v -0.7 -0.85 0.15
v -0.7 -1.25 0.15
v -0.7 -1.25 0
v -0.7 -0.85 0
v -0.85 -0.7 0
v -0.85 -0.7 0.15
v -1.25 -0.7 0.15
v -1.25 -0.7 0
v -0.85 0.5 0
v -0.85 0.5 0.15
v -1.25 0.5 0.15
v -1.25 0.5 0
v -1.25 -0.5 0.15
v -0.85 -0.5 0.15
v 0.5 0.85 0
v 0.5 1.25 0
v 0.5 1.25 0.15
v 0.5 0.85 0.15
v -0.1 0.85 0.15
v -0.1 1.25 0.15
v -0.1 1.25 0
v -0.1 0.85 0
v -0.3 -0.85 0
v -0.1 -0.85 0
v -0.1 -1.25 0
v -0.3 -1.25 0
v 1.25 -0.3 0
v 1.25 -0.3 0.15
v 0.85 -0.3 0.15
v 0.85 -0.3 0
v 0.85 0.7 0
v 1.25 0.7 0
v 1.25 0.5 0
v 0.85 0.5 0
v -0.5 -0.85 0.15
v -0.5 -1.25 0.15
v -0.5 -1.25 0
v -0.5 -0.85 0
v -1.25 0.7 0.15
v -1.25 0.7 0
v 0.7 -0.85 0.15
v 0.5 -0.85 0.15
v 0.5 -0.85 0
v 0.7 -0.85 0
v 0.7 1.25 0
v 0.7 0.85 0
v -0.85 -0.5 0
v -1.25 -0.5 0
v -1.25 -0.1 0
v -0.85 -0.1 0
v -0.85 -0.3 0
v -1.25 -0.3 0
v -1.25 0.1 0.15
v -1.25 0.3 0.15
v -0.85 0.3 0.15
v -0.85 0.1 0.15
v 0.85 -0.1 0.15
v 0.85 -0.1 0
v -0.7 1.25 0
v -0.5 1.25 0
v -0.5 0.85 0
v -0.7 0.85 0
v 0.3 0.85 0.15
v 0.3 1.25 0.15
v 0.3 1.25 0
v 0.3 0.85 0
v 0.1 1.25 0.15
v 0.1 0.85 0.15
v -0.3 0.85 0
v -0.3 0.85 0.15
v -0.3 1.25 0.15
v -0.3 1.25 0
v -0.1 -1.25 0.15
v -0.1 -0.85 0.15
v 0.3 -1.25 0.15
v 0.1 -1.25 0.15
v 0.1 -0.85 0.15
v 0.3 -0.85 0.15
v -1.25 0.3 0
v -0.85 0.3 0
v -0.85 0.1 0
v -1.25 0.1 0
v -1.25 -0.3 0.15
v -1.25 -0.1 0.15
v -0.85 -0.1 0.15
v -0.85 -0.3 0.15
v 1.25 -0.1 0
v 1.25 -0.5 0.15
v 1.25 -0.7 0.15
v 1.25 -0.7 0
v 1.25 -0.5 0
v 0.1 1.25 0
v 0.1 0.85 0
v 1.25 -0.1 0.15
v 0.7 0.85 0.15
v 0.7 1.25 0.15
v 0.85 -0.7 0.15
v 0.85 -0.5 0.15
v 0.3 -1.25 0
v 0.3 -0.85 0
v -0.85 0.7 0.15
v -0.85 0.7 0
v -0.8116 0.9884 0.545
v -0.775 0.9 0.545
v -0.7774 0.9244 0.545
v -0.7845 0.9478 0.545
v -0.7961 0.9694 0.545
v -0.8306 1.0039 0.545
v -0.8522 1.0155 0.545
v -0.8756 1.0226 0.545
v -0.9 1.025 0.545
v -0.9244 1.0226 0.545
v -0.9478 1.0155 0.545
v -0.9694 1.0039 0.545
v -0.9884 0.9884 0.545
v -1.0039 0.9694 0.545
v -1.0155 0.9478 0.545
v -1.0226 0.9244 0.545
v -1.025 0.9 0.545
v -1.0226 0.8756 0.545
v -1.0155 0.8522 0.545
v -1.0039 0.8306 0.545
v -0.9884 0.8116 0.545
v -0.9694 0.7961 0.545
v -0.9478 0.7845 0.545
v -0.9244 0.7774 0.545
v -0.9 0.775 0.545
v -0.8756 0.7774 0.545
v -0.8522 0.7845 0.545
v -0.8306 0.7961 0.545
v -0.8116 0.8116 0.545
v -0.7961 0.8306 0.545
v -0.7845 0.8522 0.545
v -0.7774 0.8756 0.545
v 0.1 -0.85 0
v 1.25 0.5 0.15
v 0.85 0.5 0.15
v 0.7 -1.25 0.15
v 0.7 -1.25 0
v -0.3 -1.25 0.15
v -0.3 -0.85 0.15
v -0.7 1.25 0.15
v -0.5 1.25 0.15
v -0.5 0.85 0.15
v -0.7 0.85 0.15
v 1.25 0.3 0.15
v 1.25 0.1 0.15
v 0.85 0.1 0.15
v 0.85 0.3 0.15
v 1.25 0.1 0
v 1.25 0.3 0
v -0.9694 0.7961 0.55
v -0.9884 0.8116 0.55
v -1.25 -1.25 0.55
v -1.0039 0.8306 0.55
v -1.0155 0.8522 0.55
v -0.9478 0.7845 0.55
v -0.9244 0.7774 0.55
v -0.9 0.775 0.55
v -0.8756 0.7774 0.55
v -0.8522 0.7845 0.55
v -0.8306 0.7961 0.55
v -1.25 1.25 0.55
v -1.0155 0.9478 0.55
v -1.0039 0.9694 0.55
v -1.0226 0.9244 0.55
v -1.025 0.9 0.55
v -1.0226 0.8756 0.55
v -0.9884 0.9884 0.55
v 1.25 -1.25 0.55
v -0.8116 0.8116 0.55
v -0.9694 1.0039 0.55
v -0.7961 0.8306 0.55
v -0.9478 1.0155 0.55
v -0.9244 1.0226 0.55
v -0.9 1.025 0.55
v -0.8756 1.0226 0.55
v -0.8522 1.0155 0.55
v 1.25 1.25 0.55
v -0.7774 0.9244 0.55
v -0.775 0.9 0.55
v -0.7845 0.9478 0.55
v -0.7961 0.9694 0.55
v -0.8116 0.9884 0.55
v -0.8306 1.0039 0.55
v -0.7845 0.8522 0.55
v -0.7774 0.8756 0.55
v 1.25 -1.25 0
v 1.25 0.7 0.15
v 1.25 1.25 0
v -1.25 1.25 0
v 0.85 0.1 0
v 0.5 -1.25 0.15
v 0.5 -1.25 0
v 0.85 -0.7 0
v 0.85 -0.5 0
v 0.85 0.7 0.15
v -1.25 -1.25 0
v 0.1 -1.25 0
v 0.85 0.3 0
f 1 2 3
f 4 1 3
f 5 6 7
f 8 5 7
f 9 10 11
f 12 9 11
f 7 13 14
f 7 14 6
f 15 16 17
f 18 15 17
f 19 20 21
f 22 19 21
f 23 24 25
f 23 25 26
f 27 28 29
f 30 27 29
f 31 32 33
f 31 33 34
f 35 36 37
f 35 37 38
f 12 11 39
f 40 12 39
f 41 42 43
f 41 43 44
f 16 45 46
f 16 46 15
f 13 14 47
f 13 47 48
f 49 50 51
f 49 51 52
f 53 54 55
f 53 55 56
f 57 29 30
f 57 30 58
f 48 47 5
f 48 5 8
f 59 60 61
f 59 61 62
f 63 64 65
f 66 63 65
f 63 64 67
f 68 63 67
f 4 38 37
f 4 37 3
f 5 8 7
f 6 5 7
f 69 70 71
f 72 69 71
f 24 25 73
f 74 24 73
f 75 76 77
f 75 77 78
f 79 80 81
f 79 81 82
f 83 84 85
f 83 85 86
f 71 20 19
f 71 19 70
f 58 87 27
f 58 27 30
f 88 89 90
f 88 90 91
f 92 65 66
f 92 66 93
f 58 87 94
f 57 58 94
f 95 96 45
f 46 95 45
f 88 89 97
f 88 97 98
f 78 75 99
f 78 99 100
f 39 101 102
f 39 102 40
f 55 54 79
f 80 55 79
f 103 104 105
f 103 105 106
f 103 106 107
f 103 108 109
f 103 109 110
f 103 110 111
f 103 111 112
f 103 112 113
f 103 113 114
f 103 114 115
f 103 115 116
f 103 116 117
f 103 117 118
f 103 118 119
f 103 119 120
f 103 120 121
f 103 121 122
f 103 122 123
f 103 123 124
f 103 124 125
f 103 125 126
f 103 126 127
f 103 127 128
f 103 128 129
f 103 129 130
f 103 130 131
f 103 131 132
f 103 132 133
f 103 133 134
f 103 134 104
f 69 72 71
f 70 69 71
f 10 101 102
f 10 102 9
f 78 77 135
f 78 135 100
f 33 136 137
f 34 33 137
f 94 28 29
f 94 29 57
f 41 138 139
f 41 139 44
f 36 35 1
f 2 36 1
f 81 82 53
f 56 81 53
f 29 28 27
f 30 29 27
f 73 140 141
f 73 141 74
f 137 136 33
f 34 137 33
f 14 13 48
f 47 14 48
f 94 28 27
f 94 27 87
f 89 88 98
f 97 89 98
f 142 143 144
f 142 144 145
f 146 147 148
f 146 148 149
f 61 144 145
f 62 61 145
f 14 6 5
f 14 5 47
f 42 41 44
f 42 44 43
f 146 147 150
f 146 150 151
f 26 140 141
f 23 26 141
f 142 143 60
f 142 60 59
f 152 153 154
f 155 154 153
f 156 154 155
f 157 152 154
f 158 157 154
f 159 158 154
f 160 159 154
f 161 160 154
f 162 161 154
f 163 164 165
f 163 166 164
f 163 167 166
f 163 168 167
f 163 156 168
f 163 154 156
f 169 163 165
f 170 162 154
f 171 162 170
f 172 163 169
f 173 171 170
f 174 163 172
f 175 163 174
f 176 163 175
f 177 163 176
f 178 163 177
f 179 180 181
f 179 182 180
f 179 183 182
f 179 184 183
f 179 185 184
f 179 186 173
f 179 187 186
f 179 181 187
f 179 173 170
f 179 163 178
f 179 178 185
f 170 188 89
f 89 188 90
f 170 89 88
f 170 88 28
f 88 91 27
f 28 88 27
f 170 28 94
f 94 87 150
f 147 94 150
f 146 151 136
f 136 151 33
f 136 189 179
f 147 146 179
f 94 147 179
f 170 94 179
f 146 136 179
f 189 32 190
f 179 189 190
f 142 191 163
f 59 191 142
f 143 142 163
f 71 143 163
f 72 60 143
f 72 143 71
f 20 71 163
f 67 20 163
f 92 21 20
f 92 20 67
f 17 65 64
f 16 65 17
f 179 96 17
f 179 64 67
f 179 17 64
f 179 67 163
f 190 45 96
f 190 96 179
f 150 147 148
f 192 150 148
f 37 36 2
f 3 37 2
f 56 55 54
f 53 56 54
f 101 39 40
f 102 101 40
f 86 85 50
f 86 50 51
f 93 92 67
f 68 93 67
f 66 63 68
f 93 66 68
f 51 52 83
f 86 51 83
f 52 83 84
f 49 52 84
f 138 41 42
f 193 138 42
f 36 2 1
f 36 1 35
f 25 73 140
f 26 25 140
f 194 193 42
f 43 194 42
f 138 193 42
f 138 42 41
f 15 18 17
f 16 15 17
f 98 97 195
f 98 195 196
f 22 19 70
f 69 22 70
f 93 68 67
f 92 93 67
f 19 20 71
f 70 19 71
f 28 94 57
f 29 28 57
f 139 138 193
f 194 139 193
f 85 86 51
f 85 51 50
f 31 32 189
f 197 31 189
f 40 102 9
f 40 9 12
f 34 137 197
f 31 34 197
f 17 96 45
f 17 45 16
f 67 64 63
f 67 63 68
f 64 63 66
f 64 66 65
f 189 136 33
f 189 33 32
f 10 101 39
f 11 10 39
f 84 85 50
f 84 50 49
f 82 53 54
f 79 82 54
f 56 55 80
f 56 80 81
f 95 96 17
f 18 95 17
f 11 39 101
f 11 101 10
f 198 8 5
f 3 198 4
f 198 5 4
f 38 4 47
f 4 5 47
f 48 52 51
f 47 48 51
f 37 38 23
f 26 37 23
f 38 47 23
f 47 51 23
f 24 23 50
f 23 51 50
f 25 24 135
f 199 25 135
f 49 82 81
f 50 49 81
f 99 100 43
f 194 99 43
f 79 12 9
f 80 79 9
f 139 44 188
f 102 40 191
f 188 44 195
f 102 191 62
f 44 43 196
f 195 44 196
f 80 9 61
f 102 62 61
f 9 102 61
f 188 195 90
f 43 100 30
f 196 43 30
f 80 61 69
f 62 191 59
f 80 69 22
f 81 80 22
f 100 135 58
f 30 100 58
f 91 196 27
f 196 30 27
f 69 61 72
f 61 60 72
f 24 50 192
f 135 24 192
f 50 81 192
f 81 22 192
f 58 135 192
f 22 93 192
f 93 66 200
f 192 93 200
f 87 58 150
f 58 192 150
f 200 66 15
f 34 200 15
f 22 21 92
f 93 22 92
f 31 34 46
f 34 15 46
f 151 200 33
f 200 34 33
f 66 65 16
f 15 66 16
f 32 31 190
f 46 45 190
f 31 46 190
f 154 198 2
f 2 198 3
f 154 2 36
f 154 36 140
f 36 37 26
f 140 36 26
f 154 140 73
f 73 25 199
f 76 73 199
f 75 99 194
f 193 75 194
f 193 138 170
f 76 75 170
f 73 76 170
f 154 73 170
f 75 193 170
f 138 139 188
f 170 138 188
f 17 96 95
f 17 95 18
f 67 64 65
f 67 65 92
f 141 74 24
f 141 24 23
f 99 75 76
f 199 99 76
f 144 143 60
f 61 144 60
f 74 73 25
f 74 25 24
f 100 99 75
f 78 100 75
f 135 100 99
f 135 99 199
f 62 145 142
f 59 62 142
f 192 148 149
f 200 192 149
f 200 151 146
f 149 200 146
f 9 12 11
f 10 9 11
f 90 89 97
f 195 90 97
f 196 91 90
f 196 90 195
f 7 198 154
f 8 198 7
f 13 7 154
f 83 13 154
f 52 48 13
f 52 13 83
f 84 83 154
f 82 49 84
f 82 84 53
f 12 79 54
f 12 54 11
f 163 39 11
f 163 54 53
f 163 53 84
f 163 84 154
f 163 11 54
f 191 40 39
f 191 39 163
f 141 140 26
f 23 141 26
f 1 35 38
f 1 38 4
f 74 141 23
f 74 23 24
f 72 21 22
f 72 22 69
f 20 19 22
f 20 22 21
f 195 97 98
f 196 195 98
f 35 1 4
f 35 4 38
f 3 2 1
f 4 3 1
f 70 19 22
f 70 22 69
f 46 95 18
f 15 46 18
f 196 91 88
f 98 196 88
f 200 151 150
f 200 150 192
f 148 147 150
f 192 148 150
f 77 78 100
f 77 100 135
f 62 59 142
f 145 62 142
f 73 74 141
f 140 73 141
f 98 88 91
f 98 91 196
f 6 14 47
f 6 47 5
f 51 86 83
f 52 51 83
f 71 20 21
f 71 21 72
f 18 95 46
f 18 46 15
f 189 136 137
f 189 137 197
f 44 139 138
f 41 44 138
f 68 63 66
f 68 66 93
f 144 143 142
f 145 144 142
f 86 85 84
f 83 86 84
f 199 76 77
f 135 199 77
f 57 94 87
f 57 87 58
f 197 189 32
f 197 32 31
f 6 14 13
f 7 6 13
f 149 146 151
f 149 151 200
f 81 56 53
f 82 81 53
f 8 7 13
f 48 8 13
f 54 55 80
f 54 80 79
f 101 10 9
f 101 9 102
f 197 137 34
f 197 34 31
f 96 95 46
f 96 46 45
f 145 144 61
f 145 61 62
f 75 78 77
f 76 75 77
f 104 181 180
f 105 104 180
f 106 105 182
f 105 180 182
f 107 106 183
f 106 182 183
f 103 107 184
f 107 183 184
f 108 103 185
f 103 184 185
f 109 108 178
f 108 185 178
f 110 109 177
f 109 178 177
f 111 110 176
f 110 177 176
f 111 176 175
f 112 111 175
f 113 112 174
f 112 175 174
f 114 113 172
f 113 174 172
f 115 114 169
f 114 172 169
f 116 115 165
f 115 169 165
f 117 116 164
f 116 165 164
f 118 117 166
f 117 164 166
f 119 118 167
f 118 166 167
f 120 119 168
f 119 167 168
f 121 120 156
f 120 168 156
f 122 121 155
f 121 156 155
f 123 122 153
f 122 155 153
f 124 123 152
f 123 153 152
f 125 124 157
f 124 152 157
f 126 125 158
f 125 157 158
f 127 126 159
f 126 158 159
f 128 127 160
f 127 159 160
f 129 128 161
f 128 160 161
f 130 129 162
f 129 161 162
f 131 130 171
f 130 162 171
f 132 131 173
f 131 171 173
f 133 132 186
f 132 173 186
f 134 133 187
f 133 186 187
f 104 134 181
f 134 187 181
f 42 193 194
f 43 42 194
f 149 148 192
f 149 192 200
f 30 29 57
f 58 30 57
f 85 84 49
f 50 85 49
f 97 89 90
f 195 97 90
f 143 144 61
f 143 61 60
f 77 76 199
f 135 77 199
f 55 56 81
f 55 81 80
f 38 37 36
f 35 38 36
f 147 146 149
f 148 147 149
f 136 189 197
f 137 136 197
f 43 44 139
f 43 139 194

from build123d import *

# Parameters (mm, degrees)
SKETCH1_W              = 2.5
SKETCH1_H              = 2.5
BOSS_EXTRUDE1_DEPTH    = 0.55
SKETCH2_W              = 0.2
SKETCH2_H              = 0.15
CUT_EXTRUDE1_DEPTH     = 0.4
CIRPATTERN1_COUNT      = 4
SKETCH3_W              = 0.2
SKETCH3_H              = 0.4
BOSS_EXTRUDE2_DEPTH    = 0.15
BOSS_EXTRUDE2_2_DEPTH  = 0.15
BOSS_EXTRUDE2_3_DEPTH  = 0.15
BOSS_EXTRUDE2_4_DEPTH  = 0.15
SKETCH3_W_2            = 0.4
SKETCH3_H_2            = 0.2
BOSS_EXTRUDE2_5_DEPTH  = 0.15
BOSS_EXTRUDE2_6_DEPTH  = 0.15
BOSS_EXTRUDE2_7_DEPTH  = 0.15
BOSS_EXTRUDE2_8_DEPTH  = 0.15
BOSS_EXTRUDE2_9_DEPTH  = 0.15
BOSS_EXTRUDE2_10_DEPTH = 0.15
BOSS_EXTRUDE2_11_DEPTH = 0.15
BOSS_EXTRUDE2_12_DEPTH = 0.15
BOSS_EXTRUDE2_13_DEPTH = 0.15
BOSS_EXTRUDE2_14_DEPTH = 0.15
BOSS_EXTRUDE2_15_DEPTH = 0.15
BOSS_EXTRUDE2_16_DEPTH = 0.15
SKETCH4_R              = 0.125
CUT_EXTRUDE2_DEPTH     = 0.005


with BuildPart() as part:
    # Sketch1 → Boss-Extrude1 (new body)
    with BuildSketch(Plane.XY):
        Rectangle(SKETCH1_W, SKETCH1_H)
    extrude(amount=BOSS_EXTRUDE1_DEPTH)

    # Sketch2 → Cut-Extrude1 (cut)
    with BuildSketch(Plane.XZ.offset(1.25)):
        with Locations((0.6, -0.075)):
            Rectangle(SKETCH2_W, SKETCH2_H)
        with Locations((0.6, 0.075)):
            Rectangle(SKETCH2_W, SKETCH2_H)
        with Locations((0.2, -0.075)):
            Rectangle(SKETCH2_W, SKETCH2_H)
        with Locations((0.2, 0.075)):
            Rectangle(SKETCH2_W, SKETCH2_H)
        with Locations((-0.2, 0.075)):
            Rectangle(SKETCH2_W, SKETCH2_H)
        with Locations((-0.2, -0.075)):
            Rectangle(SKETCH2_W, SKETCH2_H)
        with Locations((-0.6, 0.075)):
            Rectangle(SKETCH2_W, SKETCH2_H)
        with Locations((-0.6, -0.075)):
            Rectangle(SKETCH2_W, SKETCH2_H)
    cut_extrude1 = extrude(amount=-CUT_EXTRUDE1_DEPTH, mode=Mode.SUBTRACT)

    # CirPattern1: Cut-Extrude1 ×4 about axis
    cirpattern1_axis = Axis((0, 0, 0), (0, 0, 1))
    for i in range(1, CIRPATTERN1_COUNT):
        add(cut_extrude1.rotate(cirpattern1_axis, i * 360 / CIRPATTERN1_COUNT), mode=Mode.SUBTRACT)

    # Sketch4 → Cut-Extrude2 (cut)
    with BuildSketch(Plane.XY.offset(0.55)):
        with Locations((-0.9, 0.9)):
            Circle(SKETCH4_R)
    extrude(amount=-CUT_EXTRUDE2_DEPTH, mode=Mode.SUBTRACT)


with BuildPart() as body_2:
    # Sketch3 → Boss-Extrude2 (new body)
    with BuildSketch(Plane(origin=(0, 0, 0.15), x_dir=(-1, 0, 0), z_dir=(0, 0, -1))):
        with Locations((-0.6, -1.05)):
            Rectangle(SKETCH3_W, SKETCH3_H)
    extrude(amount=BOSS_EXTRUDE2_DEPTH)


with BuildPart() as body_3:
    # Sketch3 → Boss-Extrude2 2 (new body)
    with BuildSketch(Plane(origin=(0, 0, 0.15), x_dir=(-1, 0, 0), z_dir=(0, 0, -1))):
        with Locations((-0.2, -1.05)):
            Rectangle(SKETCH3_W, SKETCH3_H)
    extrude(amount=BOSS_EXTRUDE2_2_DEPTH)


with BuildPart() as body_4:
    # Sketch3 → Boss-Extrude2 3 (new body)
    with BuildSketch(Plane(origin=(0, 0, 0.15), x_dir=(-1, 0, 0), z_dir=(0, 0, -1))):
        with Locations((0.2, -1.05)):
            Rectangle(SKETCH3_W, SKETCH3_H)
    extrude(amount=BOSS_EXTRUDE2_3_DEPTH)


with BuildPart() as body_5:
    # Sketch3 → Boss-Extrude2 4 (new body)
    with BuildSketch(Plane(origin=(0, 0, 0.15), x_dir=(-1, 0, 0), z_dir=(0, 0, -1))):
        with Locations((0.6, -1.05)):
            Rectangle(SKETCH3_W, SKETCH3_H)
    extrude(amount=BOSS_EXTRUDE2_4_DEPTH)


with BuildPart() as body_6:
    # Sketch3 → Boss-Extrude2 5 (new body)
    with BuildSketch(Plane(origin=(0, 0, 0.15), x_dir=(-1, 0, 0), z_dir=(0, 0, -1))):
        with Locations((1.05, -0.6)):
            Rectangle(SKETCH3_W_2, SKETCH3_H_2)
    extrude(amount=BOSS_EXTRUDE2_5_DEPTH)


with BuildPart() as body_7:
    # Sketch3 → Boss-Extrude2 6 (new body)
    with BuildSketch(Plane(origin=(0, 0, 0.15), x_dir=(-1, 0, 0), z_dir=(0, 0, -1))):
        with Locations((1.05, -0.2)):
            Rectangle(SKETCH3_W_2, SKETCH3_H_2)
    extrude(amount=BOSS_EXTRUDE2_6_DEPTH)


with BuildPart() as body_8:
    # Sketch3 → Boss-Extrude2 7 (new body)
    with BuildSketch(Plane(origin=(0, 0, 0.15), x_dir=(-1, 0, 0), z_dir=(0, 0, -1))):
        with Locations((1.05, 0.2)):
            Rectangle(SKETCH3_W_2, SKETCH3_H_2)
    extrude(amount=BOSS_EXTRUDE2_7_DEPTH)


with BuildPart() as body_9:
    # Sketch3 → Boss-Extrude2 8 (new body)
    with BuildSketch(Plane(origin=(0, 0, 0.15), x_dir=(-1, 0, 0), z_dir=(0, 0, -1))):
        with Locations((1.05, 0.6)):
            Rectangle(SKETCH3_W_2, SKETCH3_H_2)
    extrude(amount=BOSS_EXTRUDE2_8_DEPTH)


with BuildPart() as body_10:
    # Sketch3 → Boss-Extrude2 9 (new body)
    with BuildSketch(Plane(origin=(0, 0, 0.15), x_dir=(-1, 0, 0), z_dir=(0, 0, -1))):
        with Locations((0.6, 1.05)):
            Rectangle(SKETCH3_W, SKETCH3_H)
    extrude(amount=BOSS_EXTRUDE2_9_DEPTH)


with BuildPart() as body_11:
    # Sketch3 → Boss-Extrude2 10 (new body)
    with BuildSketch(Plane(origin=(0, 0, 0.15), x_dir=(-1, 0, 0), z_dir=(0, 0, -1))):
        with Locations((0.2, 1.05)):
            Rectangle(SKETCH3_W, SKETCH3_H)
    extrude(amount=BOSS_EXTRUDE2_10_DEPTH)


with BuildPart() as body_12:
    # Sketch3 → Boss-Extrude2 11 (new body)
    with BuildSketch(Plane(origin=(0, 0, 0.15), x_dir=(-1, 0, 0), z_dir=(0, 0, -1))):
        with Locations((-0.2, 1.05)):
            Rectangle(SKETCH3_W, SKETCH3_H)
    extrude(amount=BOSS_EXTRUDE2_11_DEPTH)


with BuildPart() as body_13:
    # Sketch3 → Boss-Extrude2 12 (new body)
    with BuildSketch(Plane(origin=(0, 0, 0.15), x_dir=(-1, 0, 0), z_dir=(0, 0, -1))):
        with Locations((-0.6, 1.05)):
            Rectangle(SKETCH3_W, SKETCH3_H)
    extrude(amount=BOSS_EXTRUDE2_12_DEPTH)


with BuildPart() as body_14:
    # Sketch3 → Boss-Extrude2 13 (new body)
    with BuildSketch(Plane(origin=(0, 0, 0.15), x_dir=(-1, 0, 0), z_dir=(0, 0, -1))):
        with Locations((-1.05, 0.6)):
            Rectangle(SKETCH3_W_2, SKETCH3_H_2)
    extrude(amount=BOSS_EXTRUDE2_13_DEPTH)


with BuildPart() as body_15:
    # Sketch3 → Boss-Extrude2 14 (new body)
    with BuildSketch(Plane(origin=(0, 0, 0.15), x_dir=(-1, 0, 0), z_dir=(0, 0, -1))):
        with Locations((-1.05, 0.2)):
            Rectangle(SKETCH3_W_2, SKETCH3_H_2)
    extrude(amount=BOSS_EXTRUDE2_14_DEPTH)


with BuildPart() as body_16:
    # Sketch3 → Boss-Extrude2 15 (new body)
    with BuildSketch(Plane(origin=(0, 0, 0.15), x_dir=(-1, 0, 0), z_dir=(0, 0, -1))):
        with Locations((-1.05, -0.2)):
            Rectangle(SKETCH3_W_2, SKETCH3_H_2)
    extrude(amount=BOSS_EXTRUDE2_15_DEPTH)


with BuildPart() as body_17:
    # Sketch3 → Boss-Extrude2 16 (new body)
    with BuildSketch(Plane(origin=(0, 0, 0.15), x_dir=(-1, 0, 0), z_dir=(0, 0, -1))):
        with Locations((-1.05, -0.6)):
            Rectangle(SKETCH3_W_2, SKETCH3_H_2)
    extrude(amount=BOSS_EXTRUDE2_16_DEPTH)


solid = Compound([part.part, body_2.part, body_3.part, body_4.part, body_5.part, body_6.part, body_7.part, body_8.part, body_9.part, body_10.part, body_11.part, body_12.part, body_13.part, body_14.part, body_15.part, body_16.part, body_17.part])
